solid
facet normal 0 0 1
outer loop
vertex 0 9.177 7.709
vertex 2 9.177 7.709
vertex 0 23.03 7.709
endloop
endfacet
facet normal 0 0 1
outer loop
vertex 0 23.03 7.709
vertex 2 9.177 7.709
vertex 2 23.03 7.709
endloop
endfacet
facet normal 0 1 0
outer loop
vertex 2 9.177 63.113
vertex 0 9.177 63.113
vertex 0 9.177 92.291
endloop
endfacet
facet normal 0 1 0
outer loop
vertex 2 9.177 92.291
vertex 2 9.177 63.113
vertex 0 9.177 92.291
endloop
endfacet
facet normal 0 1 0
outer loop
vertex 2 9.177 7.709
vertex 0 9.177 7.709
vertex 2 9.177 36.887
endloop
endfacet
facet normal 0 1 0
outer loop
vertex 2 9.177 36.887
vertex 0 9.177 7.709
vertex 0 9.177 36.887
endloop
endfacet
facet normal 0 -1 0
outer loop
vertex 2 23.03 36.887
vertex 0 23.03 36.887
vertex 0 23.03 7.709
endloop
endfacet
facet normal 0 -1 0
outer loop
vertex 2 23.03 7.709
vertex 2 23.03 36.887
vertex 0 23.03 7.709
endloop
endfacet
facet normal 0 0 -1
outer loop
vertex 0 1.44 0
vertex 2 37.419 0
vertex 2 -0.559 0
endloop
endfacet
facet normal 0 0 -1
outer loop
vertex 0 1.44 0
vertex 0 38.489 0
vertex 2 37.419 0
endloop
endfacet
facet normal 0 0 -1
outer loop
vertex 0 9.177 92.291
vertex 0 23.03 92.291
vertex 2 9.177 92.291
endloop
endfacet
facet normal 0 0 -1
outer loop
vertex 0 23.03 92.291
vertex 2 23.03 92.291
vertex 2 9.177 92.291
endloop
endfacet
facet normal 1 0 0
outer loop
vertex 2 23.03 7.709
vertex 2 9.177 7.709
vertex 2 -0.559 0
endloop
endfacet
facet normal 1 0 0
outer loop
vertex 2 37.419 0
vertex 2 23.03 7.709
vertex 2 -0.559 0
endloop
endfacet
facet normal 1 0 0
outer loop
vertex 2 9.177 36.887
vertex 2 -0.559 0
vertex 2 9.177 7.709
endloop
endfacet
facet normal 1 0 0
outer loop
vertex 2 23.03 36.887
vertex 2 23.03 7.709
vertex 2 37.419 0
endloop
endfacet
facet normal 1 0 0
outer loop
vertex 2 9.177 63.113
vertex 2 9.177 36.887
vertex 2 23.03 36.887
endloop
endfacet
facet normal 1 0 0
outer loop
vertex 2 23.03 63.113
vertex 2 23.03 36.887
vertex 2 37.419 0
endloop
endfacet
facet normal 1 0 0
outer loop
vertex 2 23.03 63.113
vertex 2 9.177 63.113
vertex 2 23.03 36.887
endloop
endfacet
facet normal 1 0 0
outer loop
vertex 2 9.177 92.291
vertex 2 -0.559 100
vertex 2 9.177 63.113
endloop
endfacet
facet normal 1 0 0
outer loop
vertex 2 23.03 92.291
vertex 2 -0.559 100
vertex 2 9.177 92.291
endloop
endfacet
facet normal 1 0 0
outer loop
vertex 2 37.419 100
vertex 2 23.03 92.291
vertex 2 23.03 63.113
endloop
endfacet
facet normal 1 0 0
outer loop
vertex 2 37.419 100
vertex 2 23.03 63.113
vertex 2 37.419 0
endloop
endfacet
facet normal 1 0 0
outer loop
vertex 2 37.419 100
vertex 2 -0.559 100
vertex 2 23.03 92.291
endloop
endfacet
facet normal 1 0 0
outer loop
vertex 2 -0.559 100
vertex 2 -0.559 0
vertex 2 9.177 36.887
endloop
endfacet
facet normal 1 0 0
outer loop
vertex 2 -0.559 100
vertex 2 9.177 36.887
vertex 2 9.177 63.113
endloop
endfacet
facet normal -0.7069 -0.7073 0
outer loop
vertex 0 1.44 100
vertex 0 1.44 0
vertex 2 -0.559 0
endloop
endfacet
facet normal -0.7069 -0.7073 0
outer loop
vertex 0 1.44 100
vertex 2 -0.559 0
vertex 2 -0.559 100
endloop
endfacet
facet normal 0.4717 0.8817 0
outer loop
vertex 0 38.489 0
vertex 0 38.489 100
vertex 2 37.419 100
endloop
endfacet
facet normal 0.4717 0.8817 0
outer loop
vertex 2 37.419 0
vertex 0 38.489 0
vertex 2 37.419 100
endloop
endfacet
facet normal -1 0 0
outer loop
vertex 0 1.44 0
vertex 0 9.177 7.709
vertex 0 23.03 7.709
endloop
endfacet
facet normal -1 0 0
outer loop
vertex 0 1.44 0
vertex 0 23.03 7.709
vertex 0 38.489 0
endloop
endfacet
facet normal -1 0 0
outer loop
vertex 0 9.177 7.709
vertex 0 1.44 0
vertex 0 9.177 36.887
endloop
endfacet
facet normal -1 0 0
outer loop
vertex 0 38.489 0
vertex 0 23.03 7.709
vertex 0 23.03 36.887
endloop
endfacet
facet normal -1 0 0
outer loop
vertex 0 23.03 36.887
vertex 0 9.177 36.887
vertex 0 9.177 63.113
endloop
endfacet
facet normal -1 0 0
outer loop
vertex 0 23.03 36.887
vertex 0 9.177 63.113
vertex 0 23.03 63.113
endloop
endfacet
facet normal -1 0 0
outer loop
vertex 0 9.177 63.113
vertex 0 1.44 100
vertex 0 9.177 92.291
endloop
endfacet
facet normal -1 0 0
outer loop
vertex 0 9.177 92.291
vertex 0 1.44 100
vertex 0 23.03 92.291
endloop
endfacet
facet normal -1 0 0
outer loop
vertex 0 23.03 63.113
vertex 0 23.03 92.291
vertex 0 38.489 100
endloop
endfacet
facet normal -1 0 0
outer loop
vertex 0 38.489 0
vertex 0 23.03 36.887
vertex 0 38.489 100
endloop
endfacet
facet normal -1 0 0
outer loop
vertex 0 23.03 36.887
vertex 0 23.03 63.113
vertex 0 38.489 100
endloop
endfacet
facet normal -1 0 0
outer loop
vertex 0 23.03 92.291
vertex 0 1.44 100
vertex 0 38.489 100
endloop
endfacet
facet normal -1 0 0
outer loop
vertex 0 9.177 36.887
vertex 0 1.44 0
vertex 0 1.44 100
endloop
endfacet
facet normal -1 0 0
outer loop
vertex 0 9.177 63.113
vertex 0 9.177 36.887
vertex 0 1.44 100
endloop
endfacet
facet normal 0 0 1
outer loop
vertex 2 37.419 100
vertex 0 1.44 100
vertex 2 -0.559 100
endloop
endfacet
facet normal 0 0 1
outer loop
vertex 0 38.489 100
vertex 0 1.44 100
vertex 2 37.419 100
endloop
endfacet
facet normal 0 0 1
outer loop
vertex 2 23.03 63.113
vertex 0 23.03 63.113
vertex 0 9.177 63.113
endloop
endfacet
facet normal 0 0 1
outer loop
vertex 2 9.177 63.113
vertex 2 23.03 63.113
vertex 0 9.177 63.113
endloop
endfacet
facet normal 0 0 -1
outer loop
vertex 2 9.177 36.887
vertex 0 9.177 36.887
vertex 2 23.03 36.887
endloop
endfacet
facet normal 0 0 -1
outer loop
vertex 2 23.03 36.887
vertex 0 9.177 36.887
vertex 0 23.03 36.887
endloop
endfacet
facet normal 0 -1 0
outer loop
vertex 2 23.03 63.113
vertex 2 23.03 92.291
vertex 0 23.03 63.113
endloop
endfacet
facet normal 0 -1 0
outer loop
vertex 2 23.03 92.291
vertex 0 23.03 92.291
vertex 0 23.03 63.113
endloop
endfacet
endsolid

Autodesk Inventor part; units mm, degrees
ref_plane "YZ Plane" through (0, 0, 0) normal (1, 0, 0) x (0, 1, 0)
ref_plane "XZ Plane" through (0, 0, 0) normal (0, 1, 0) x (-1, 0, 0)
ref_plane "XY Plane" through (0, 0, 0) normal (0, 0, 1) x (1, 0, 0)
sketch "Szkic1" plane through (0, 0, 0) normal (1, 0, 0) x (0, 1, 0)
  line L0 (9.1767, 36.8868) -> (23.0303, 36.8868)
  line L1 (23.0303, 36.8868) -> (23.0303, 8.0794)
  line L2 (22.5303, 5.7086) -> (9.1767, 5.7086)
  line L3 (9.1767, 5.7086) -> (9.1767, 36.8868)
  line L4 (0, 100) -> (39.1311, 100)
  line L5 (39.1311, 0) -> (0, 0)
  line L6 (23.0303, 63.1132) -> (9.1767, 63.1132)
  line L7 (9.1767, 63.1132) -> (9.1767, 94.2914)
  line L8 (9.1767, 94.2914) -> (23.0303, 94.2914)
  line L9 (23.0303, 94.2914) -> (23.0303, 63.1132)
  line L10 (39.1311, 100) -> (40.1311, 100)
  line L11 (40.1311, 0) -> (39.1311, 0)
  line L12 (40.1311, 100) -> (40.1311, 0)
  line L13 (-0.559, 100) -> (-0.1118, 100)
  line L14 (-0.559, 100) -> (-0.559, 0)
  line L15 (-0.1118, 0) -> (-0.559, 0)
  line L16 (-0.1118, 100) -> (0.1125, 100)
  line L17 (23.0303, 8.0794) -> (23.0303, 5.7086)
  line L18 (23.0303, 5.7086) -> (22.5303, 5.7086)
  line L19 (40.1311, 100) -> (-0.559, 100)
  line L20 (-0.559, 100) -> (-0.559, 0)
  line L21 (-0.559, 0) -> (40.1311, 0)
  line L22 (40.1311, 0) -> (40.1311, 100)
  point P0 (11.7487, 100)
extrude "Wyciągnięcie proste1" add sketch "Szkic1" along normal blind 2
chamfer "Faza1" distance 2 angle 45 2 edges at (0, -0.559, 50) (2, 40.1311, 50)
sketch "Szkic2" plane through (0, 1.441, 100) normal (0, 0, 1) x (1, 0, 0)
  line L0 (0, 37.0479) -> (-58.736, 68.461) projected
  line L1 (0, 37.0479) -> (5, 34.3738)
  line L2 (5, 34.3738) -> (2.5, 39)
  line L3 (2.5, 39) -> (-2, 40)
  line L4 (-2, 40) -> (-2.3739, 38.3175)
  point P0 (0, -1.441)
extrude "Wyciągnięcie proste2" cut sketch "Szkic2" against normal through all
sketch "Szkic3" plane through (2, 0, 0) normal (1, 0, 0) x (0, 0, -1)
  line L0 (-94.2914, 9.1767) -> (-94.2914, 23.0303) projected
  line L1 (-94.2914, 23.0303) -> (-63.1132, 23.0303) projected
  line L2 (-63.1132, 9.1767) -> (-94.2914, 9.1767) projected
  line L3 (-5.7086, 9.1767) -> (-36.8868, 9.1767) projected
  line L4 (-36.8868, 23.0303) -> (-5.7086, 23.0303) projected
  line L5 (-5.7086, 23.0303) -> (-5.7086, 9.1767) projected
  line L6 (-63.1132, 9.1767) -> (-94.2914, 9.1767) projected
  line L7 (-94.2914, 23.0303) -> (-92.2914, 23.0303)
  line L8 (-92.2914, 23.0303) -> (-92.2914, 9.1767)
  line L9 (-92.2914, 9.1767) -> (-94.2914, 9.1767)
  line L10 (-94.2914, 9.1767) -> (-94.2914, 23.0303)
  line L11 (-5.7086, 9.1767) -> (-36.8868, 9.1767) projected
  line L12 (-36.8868, 23.0303) -> (-5.7086, 23.0303) projected
  line L13 (-5.7086, 9.1767) -> (-7.7086, 9.1767)
  line L14 (-7.7086, 9.1767) -> (-7.7086, 23.0303)
  line L15 (-7.7086, 23.0303) -> (-5.7086, 23.0303)
  line L16 (-5.7086, 23.0303) -> (-5.7086, 9.1767)
  point P0 (0, 0)
  dimension "d7" = 2
  dimension "d8" = 2
extrude "Wyciągnięcie proste3" add sketch "Szkic3" against normal blind 2
properties part number "plug_nowy" material "Aluminium 6061"
